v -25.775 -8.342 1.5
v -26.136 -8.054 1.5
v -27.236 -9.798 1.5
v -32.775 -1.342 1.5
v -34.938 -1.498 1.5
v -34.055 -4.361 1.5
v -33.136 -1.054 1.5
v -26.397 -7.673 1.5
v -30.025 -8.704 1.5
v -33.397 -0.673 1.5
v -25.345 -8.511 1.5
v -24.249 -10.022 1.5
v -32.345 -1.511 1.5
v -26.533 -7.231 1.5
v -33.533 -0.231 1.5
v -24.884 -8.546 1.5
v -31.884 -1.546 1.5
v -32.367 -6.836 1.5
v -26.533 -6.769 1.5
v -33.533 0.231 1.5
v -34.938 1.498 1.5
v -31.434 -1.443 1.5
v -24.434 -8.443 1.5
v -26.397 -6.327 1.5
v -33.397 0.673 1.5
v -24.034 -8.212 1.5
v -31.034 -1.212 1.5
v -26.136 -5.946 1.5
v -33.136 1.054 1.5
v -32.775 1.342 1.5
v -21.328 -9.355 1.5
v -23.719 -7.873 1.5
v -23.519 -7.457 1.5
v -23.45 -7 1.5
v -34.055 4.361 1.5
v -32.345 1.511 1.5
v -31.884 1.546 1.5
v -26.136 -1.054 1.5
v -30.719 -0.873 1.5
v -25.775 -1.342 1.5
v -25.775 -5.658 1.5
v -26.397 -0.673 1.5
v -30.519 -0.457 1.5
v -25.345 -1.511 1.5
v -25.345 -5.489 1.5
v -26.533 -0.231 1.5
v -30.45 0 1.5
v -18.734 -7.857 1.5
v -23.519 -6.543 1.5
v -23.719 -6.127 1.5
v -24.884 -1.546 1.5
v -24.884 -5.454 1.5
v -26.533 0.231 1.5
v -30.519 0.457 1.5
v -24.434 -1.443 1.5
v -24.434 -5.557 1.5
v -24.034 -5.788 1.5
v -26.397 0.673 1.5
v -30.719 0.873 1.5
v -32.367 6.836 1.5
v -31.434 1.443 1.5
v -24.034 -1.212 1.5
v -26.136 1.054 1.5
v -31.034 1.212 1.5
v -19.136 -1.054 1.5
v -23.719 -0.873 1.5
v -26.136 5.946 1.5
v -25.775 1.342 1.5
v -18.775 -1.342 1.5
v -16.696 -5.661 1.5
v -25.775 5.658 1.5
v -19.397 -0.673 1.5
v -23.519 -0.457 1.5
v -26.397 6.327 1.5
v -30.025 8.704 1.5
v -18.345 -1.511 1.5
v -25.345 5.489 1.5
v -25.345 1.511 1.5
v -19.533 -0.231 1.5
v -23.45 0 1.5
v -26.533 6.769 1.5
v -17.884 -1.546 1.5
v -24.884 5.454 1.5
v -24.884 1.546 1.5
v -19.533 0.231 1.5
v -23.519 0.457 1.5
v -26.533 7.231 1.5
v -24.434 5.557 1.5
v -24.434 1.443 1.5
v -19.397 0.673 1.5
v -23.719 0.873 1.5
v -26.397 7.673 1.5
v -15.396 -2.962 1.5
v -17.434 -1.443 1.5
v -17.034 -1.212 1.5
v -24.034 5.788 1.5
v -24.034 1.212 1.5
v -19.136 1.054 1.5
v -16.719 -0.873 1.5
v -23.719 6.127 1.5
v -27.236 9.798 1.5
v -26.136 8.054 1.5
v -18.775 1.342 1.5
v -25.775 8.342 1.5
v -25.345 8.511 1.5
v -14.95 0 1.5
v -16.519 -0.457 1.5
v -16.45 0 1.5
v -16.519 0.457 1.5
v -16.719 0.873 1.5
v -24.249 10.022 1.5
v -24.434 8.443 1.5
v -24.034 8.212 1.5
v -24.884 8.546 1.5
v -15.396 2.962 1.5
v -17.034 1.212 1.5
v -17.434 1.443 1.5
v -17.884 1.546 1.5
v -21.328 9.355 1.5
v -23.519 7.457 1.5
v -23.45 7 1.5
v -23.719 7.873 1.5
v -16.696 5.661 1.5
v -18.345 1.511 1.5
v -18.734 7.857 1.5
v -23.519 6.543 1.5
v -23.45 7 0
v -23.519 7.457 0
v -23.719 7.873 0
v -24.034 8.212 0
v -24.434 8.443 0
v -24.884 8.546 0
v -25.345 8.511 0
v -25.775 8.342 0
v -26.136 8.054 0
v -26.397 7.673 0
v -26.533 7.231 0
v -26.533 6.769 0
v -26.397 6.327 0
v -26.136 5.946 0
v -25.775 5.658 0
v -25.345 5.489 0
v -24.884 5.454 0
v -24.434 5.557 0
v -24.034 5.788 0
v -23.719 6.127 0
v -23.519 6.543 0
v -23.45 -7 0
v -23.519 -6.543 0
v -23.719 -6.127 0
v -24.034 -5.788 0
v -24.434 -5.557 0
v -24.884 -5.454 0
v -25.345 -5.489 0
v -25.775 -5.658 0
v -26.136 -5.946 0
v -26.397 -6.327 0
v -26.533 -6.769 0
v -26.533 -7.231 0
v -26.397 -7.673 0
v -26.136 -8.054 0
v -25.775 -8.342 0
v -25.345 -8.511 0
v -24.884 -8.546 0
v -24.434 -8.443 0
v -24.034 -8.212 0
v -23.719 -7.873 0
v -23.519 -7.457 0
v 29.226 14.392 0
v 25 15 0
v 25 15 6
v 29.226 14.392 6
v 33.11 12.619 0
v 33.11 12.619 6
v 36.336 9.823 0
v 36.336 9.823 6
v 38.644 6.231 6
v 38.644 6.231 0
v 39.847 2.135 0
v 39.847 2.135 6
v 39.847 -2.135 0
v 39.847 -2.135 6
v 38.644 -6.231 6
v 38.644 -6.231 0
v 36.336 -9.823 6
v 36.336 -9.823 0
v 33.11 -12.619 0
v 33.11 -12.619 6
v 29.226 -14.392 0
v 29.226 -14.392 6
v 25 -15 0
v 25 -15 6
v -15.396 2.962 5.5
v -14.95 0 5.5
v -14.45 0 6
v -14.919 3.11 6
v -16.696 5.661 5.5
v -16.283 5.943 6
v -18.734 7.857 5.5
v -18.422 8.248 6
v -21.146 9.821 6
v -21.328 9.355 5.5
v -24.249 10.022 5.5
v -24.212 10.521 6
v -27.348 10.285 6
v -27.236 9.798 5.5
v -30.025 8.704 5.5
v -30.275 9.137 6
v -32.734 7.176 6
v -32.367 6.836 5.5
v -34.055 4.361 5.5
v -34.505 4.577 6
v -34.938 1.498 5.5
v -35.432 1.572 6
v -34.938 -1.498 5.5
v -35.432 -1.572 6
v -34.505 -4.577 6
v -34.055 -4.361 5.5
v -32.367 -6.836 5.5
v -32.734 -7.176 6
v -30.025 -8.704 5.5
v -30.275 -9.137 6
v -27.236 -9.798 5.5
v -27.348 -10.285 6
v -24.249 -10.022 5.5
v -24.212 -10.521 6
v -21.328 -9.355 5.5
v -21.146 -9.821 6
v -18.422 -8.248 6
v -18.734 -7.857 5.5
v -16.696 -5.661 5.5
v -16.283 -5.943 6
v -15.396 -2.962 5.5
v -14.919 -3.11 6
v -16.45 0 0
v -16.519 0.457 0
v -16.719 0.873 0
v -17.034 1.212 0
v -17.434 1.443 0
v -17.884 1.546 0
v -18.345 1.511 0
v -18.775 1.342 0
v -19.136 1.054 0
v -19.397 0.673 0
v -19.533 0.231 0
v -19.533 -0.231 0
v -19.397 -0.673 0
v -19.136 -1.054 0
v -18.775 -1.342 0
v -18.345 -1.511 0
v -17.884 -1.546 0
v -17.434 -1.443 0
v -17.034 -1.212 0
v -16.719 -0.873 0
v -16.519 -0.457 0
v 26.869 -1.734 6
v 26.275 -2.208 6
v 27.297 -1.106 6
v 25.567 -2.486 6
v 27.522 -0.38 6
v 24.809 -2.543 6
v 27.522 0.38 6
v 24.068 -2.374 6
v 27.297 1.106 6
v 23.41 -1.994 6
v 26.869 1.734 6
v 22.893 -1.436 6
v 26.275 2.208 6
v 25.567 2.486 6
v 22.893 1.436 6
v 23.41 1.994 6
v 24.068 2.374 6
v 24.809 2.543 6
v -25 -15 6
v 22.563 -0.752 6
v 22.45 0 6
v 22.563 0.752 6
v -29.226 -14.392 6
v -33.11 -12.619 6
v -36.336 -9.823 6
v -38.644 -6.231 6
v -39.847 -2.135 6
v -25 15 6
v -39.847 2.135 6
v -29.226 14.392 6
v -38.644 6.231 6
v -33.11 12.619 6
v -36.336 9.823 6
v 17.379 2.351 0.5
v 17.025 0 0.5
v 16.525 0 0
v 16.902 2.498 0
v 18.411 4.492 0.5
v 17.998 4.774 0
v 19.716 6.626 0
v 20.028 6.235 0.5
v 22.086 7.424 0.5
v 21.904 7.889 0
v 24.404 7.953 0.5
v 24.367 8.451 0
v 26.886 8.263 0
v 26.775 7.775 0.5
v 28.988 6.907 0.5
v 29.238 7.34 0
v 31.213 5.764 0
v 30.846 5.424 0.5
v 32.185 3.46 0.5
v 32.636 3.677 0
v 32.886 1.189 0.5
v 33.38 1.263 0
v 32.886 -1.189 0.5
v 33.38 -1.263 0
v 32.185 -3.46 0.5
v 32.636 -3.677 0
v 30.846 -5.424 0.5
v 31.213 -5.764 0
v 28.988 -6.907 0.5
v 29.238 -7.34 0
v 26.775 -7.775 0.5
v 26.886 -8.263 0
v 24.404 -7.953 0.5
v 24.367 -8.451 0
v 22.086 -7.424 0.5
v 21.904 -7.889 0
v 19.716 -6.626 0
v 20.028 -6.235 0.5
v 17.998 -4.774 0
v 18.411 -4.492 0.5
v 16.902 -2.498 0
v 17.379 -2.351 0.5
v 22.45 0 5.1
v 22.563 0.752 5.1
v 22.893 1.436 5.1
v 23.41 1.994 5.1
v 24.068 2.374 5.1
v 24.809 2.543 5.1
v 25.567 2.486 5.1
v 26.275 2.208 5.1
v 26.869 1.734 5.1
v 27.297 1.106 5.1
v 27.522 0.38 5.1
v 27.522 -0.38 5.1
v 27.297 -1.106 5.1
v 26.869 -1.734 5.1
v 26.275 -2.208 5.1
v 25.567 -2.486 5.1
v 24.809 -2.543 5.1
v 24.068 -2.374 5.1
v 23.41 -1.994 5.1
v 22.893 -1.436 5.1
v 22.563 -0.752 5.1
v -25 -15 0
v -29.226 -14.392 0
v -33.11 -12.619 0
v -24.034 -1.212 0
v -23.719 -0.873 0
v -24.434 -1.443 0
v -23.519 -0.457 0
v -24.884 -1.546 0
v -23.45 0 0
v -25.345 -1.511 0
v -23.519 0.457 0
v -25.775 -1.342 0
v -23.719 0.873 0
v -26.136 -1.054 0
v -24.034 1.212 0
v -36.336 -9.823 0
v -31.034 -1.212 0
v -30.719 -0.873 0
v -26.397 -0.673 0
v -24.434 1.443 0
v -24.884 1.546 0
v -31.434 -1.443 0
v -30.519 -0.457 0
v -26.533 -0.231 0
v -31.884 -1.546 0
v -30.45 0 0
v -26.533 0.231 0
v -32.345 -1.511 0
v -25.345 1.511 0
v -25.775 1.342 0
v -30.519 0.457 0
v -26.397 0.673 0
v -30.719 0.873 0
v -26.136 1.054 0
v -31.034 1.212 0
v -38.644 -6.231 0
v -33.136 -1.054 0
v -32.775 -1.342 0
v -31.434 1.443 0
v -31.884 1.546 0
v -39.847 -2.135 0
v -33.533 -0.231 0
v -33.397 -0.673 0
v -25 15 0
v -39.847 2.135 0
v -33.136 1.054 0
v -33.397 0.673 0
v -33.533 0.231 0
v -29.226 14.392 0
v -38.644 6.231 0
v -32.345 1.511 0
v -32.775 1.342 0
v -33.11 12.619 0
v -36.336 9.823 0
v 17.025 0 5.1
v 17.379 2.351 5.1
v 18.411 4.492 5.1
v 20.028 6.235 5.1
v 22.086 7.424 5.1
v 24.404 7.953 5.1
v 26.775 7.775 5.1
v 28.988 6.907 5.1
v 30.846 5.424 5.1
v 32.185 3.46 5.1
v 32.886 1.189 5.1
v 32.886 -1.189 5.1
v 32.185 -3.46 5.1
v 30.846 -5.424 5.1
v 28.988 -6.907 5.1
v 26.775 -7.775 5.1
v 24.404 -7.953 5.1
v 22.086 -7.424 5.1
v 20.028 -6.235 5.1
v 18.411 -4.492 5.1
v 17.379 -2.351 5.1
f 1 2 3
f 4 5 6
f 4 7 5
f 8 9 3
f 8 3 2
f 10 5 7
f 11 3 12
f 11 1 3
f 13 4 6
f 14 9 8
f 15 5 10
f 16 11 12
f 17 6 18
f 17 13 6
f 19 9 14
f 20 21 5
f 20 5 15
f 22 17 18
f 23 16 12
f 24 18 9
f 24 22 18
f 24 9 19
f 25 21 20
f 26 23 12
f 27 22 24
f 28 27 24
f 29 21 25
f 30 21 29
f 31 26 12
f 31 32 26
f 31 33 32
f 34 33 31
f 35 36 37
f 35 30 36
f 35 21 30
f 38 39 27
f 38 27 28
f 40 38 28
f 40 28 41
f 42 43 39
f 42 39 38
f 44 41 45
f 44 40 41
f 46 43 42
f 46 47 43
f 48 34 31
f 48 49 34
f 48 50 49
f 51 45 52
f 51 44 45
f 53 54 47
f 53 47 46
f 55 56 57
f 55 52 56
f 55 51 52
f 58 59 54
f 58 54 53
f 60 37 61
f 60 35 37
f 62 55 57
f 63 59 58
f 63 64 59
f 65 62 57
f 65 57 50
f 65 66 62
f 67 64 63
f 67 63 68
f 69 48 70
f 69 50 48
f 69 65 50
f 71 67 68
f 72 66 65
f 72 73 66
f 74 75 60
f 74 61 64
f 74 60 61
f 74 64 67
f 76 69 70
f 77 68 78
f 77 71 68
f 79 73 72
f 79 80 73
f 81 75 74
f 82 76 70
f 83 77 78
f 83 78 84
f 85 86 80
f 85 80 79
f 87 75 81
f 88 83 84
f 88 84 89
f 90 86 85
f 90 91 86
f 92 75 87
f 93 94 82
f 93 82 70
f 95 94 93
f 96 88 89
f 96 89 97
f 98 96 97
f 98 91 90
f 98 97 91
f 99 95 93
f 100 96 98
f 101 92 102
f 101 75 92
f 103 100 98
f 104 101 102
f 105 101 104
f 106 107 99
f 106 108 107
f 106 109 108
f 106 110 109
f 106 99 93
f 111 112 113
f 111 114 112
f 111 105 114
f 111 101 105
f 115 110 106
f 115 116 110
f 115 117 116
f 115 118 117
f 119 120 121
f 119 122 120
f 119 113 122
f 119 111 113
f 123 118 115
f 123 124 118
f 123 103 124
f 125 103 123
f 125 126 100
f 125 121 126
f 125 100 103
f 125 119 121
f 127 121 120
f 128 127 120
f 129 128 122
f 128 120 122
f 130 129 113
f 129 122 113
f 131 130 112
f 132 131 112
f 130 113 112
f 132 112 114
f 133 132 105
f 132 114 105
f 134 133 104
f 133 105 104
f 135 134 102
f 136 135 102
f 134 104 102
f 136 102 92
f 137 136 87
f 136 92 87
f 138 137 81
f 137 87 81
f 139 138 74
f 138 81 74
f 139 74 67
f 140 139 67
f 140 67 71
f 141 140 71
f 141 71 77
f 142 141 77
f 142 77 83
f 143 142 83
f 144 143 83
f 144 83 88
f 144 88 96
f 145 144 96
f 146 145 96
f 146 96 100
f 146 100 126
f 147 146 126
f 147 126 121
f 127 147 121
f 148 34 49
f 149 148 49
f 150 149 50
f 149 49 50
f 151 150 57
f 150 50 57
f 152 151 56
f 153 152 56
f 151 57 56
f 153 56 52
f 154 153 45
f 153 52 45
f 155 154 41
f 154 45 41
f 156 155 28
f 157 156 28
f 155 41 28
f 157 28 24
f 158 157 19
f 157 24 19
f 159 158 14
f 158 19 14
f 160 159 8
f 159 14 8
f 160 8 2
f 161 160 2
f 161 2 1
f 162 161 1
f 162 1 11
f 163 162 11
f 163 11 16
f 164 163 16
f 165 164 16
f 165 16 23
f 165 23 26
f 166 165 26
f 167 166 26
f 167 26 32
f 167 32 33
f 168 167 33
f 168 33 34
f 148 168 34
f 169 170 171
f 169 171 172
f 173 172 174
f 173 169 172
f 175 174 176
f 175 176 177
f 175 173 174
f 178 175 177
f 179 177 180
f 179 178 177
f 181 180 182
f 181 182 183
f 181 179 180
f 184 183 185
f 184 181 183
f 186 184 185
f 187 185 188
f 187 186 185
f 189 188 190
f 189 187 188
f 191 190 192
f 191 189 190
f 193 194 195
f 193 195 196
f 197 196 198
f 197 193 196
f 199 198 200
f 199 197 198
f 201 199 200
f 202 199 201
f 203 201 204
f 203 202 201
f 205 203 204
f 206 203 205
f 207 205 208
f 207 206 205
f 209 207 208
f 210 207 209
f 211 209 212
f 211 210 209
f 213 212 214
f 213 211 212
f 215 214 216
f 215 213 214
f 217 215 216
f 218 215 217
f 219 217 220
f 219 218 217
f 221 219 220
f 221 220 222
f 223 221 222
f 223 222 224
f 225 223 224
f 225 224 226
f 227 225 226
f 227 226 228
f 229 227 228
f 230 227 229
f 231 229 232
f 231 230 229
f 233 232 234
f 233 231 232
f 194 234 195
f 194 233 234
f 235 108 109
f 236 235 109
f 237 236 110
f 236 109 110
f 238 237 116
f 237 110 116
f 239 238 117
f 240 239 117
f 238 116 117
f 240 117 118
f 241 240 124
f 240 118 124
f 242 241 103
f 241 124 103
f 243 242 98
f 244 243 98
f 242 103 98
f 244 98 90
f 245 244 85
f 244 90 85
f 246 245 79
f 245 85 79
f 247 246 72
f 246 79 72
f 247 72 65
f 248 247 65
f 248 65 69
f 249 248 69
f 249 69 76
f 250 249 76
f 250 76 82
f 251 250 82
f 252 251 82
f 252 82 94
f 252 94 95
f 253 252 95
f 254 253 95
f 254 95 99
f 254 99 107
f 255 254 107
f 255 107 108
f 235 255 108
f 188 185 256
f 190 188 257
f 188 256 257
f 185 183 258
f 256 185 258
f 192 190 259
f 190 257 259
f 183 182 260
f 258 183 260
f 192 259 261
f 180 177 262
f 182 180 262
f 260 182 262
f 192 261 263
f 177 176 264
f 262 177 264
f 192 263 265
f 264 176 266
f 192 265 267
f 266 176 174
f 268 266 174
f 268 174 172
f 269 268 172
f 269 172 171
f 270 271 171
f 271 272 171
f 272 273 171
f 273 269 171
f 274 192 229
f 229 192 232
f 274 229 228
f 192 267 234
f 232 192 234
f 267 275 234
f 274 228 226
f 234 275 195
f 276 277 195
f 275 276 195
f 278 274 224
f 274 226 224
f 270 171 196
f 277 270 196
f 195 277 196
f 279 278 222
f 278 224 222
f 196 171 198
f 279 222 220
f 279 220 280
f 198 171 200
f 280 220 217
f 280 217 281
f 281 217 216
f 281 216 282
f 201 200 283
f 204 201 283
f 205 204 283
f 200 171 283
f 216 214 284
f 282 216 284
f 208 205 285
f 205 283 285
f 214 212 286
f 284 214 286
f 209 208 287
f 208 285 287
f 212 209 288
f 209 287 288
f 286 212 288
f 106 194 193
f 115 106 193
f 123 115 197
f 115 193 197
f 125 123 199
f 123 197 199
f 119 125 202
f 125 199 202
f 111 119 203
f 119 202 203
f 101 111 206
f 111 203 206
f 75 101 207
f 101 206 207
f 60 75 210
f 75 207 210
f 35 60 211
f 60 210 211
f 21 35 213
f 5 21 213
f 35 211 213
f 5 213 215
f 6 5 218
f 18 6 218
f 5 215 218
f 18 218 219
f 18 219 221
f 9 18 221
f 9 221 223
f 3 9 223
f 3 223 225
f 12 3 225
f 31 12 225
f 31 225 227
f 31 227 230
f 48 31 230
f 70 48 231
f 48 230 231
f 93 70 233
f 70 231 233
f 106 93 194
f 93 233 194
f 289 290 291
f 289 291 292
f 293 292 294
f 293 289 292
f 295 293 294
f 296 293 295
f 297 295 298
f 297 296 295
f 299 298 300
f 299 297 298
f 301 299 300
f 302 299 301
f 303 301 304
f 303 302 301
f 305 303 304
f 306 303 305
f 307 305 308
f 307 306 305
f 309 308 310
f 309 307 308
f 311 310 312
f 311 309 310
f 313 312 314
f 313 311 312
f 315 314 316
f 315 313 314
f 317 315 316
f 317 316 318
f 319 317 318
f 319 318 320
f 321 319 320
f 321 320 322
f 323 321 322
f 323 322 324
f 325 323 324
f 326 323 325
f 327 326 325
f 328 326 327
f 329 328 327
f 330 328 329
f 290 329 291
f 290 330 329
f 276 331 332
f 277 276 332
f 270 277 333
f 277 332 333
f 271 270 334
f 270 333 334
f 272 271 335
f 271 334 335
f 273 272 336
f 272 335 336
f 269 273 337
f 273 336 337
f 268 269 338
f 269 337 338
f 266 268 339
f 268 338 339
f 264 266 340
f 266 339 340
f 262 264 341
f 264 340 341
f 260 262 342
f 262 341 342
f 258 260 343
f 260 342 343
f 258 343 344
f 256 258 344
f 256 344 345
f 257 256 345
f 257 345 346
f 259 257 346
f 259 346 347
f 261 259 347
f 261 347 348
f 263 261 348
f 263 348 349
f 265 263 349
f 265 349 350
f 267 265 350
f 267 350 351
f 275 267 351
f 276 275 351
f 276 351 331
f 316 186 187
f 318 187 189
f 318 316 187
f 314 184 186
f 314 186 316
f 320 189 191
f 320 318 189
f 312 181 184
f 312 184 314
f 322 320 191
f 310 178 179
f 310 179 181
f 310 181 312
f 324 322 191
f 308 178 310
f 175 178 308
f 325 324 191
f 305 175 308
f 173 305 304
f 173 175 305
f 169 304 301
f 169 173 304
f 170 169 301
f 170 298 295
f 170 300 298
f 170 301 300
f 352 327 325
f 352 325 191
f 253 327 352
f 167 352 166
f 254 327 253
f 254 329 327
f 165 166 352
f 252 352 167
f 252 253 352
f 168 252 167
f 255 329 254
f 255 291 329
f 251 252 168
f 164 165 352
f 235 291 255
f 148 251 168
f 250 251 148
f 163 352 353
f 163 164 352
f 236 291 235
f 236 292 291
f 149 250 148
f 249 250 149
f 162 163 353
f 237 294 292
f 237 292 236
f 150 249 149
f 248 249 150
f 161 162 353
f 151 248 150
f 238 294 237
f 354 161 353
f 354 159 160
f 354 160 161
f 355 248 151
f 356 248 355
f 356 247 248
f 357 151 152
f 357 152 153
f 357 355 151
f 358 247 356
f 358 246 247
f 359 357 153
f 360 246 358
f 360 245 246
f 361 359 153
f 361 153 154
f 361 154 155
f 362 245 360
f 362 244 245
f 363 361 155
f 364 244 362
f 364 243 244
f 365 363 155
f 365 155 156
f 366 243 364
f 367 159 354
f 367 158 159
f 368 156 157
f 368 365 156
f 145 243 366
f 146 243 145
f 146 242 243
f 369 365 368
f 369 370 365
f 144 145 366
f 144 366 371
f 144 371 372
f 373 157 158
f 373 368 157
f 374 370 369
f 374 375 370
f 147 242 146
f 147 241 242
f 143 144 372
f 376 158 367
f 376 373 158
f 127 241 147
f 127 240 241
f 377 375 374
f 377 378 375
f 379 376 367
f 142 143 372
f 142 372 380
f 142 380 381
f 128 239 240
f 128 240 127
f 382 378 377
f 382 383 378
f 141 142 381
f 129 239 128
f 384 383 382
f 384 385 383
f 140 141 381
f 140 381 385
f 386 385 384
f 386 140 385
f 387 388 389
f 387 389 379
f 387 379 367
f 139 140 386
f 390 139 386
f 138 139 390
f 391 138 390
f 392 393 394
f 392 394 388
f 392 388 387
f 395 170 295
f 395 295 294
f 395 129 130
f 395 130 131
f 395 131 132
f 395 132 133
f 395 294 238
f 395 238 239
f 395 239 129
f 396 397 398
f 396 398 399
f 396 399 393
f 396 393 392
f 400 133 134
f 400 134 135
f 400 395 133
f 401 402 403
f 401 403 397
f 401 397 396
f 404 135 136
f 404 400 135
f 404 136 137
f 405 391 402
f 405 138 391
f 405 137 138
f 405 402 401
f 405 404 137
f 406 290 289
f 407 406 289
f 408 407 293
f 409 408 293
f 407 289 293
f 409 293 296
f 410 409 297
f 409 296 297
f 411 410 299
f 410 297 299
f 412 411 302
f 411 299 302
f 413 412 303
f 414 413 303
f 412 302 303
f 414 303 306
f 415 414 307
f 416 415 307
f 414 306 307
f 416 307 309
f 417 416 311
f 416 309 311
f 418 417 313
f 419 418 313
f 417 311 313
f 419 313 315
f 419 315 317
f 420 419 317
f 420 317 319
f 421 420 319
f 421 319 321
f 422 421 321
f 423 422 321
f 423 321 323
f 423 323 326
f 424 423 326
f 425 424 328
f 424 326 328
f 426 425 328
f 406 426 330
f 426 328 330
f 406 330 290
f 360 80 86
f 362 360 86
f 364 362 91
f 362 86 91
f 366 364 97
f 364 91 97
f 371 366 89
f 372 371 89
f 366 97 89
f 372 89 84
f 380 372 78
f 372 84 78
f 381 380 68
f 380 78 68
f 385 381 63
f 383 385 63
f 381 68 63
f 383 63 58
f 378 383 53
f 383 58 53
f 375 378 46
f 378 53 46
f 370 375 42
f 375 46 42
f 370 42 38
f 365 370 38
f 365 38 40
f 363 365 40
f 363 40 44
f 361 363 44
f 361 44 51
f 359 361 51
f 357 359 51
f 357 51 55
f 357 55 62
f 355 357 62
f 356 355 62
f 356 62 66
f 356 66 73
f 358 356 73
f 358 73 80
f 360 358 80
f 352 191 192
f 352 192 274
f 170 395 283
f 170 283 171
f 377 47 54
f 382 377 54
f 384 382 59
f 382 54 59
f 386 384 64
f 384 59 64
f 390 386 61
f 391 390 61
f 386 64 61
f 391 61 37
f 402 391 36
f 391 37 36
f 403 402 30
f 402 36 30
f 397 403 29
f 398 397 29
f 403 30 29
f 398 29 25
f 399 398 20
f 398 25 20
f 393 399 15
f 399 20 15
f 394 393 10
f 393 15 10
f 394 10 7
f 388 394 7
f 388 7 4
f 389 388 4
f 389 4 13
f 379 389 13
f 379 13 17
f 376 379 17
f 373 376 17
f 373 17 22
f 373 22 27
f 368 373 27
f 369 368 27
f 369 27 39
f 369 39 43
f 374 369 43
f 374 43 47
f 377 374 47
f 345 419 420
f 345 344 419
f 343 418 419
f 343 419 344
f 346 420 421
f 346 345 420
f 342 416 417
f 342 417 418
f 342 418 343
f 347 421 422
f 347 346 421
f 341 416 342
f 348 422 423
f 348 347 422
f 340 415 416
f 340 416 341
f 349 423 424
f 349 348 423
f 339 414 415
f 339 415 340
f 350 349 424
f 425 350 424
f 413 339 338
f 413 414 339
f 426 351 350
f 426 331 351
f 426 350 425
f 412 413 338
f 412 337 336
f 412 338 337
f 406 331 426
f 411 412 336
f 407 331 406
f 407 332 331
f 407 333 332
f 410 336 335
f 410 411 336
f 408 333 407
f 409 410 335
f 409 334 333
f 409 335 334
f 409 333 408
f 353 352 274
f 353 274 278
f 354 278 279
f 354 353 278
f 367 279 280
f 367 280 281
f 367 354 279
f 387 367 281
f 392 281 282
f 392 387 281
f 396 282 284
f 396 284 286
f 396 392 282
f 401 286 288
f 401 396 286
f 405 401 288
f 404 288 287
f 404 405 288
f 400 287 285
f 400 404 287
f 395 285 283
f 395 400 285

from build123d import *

# Parameters (mm, degrees)
BOSS_EXTRUDE1_DEPTH = 6
SKETCH8_R           = 10.05
CUT_EXTRUDE4_DEPTH  = 4.5
SKETCH9_R           = 7.975
CUT_EXTRUDE5_DEPTH  = 5.1
SKETCH10_R          = 2.55
CUT_EXTRUDE6_DEPTH  = 1.9
SKETCH11_R          = 1.55
CUT_EXTRUDE7_DEPTH  = 2.5
CHAMFER1_SIZE       = 0.5


with BuildPart() as part:
    # Sketch4 → Boss-Extrude1 (new body)
    with BuildSketch(Plane.XY):
        with BuildLine():
            Line((-25, 15), (25, 15))
            ThreePointArc((25, 15), (40, 0), (25, -15))
            Line((25, -15), (-25, -15))
            ThreePointArc((-25, -15), (-40, 0), (-25, 15))
        make_face()
    extrude(amount=BOSS_EXTRUDE1_DEPTH)

    # Sketch8 → Cut-Extrude4 (cut)
    with BuildSketch(Plane.XY.offset(6)):
        with Locations((-25, 0)):
            Circle(SKETCH8_R)
    extrude(amount=-CUT_EXTRUDE4_DEPTH, mode=Mode.SUBTRACT)

    # Sketch9 → Cut-Extrude5 (cut)
    with BuildSketch(Plane(origin=(0, 0, 0), x_dir=(-1, 0, 0), z_dir=(0, 0, -1))):
        with Locations((-25, 0)):
            Circle(SKETCH9_R)
    extrude(amount=-CUT_EXTRUDE5_DEPTH, mode=Mode.SUBTRACT)

    # Sketch10 → Cut-Extrude6 (cut, through all)
    with BuildSketch(Plane(origin=(0, 0, 5.1), x_dir=(-1, 0, 0), z_dir=(0, 0, -1))):
        with Locations((-25, 0)):
            Circle(SKETCH10_R)
    extrude(amount=-CUT_EXTRUDE6_DEPTH, mode=Mode.SUBTRACT)

    # Sketch11 → Cut-Extrude7 (cut, through all)
    with BuildSketch(Plane.XY.offset(1.5)):
        with Locations((-25, 0)):
            Circle(SKETCH11_R)
        with Locations((-18, 0)):
            Circle(SKETCH11_R)
        with Locations((-32, 0)):
            Circle(SKETCH11_R)
        with Locations((-25, 7)):
            Circle(SKETCH11_R)
        with Locations((-25, -7)):
            Circle(SKETCH11_R)
    extrude(amount=-CUT_EXTRUDE7_DEPTH, mode=Mode.SUBTRACT)

    # Chamfer1
    chamfer1_edges = [part.edges().sort_by_distance(p)[0] for p in [
        (-35.05, 0, 6),
        (32.975, 0, 0),
    ]]
    chamfer(chamfer1_edges, length=CHAMFER1_SIZE)


solid = part.part
